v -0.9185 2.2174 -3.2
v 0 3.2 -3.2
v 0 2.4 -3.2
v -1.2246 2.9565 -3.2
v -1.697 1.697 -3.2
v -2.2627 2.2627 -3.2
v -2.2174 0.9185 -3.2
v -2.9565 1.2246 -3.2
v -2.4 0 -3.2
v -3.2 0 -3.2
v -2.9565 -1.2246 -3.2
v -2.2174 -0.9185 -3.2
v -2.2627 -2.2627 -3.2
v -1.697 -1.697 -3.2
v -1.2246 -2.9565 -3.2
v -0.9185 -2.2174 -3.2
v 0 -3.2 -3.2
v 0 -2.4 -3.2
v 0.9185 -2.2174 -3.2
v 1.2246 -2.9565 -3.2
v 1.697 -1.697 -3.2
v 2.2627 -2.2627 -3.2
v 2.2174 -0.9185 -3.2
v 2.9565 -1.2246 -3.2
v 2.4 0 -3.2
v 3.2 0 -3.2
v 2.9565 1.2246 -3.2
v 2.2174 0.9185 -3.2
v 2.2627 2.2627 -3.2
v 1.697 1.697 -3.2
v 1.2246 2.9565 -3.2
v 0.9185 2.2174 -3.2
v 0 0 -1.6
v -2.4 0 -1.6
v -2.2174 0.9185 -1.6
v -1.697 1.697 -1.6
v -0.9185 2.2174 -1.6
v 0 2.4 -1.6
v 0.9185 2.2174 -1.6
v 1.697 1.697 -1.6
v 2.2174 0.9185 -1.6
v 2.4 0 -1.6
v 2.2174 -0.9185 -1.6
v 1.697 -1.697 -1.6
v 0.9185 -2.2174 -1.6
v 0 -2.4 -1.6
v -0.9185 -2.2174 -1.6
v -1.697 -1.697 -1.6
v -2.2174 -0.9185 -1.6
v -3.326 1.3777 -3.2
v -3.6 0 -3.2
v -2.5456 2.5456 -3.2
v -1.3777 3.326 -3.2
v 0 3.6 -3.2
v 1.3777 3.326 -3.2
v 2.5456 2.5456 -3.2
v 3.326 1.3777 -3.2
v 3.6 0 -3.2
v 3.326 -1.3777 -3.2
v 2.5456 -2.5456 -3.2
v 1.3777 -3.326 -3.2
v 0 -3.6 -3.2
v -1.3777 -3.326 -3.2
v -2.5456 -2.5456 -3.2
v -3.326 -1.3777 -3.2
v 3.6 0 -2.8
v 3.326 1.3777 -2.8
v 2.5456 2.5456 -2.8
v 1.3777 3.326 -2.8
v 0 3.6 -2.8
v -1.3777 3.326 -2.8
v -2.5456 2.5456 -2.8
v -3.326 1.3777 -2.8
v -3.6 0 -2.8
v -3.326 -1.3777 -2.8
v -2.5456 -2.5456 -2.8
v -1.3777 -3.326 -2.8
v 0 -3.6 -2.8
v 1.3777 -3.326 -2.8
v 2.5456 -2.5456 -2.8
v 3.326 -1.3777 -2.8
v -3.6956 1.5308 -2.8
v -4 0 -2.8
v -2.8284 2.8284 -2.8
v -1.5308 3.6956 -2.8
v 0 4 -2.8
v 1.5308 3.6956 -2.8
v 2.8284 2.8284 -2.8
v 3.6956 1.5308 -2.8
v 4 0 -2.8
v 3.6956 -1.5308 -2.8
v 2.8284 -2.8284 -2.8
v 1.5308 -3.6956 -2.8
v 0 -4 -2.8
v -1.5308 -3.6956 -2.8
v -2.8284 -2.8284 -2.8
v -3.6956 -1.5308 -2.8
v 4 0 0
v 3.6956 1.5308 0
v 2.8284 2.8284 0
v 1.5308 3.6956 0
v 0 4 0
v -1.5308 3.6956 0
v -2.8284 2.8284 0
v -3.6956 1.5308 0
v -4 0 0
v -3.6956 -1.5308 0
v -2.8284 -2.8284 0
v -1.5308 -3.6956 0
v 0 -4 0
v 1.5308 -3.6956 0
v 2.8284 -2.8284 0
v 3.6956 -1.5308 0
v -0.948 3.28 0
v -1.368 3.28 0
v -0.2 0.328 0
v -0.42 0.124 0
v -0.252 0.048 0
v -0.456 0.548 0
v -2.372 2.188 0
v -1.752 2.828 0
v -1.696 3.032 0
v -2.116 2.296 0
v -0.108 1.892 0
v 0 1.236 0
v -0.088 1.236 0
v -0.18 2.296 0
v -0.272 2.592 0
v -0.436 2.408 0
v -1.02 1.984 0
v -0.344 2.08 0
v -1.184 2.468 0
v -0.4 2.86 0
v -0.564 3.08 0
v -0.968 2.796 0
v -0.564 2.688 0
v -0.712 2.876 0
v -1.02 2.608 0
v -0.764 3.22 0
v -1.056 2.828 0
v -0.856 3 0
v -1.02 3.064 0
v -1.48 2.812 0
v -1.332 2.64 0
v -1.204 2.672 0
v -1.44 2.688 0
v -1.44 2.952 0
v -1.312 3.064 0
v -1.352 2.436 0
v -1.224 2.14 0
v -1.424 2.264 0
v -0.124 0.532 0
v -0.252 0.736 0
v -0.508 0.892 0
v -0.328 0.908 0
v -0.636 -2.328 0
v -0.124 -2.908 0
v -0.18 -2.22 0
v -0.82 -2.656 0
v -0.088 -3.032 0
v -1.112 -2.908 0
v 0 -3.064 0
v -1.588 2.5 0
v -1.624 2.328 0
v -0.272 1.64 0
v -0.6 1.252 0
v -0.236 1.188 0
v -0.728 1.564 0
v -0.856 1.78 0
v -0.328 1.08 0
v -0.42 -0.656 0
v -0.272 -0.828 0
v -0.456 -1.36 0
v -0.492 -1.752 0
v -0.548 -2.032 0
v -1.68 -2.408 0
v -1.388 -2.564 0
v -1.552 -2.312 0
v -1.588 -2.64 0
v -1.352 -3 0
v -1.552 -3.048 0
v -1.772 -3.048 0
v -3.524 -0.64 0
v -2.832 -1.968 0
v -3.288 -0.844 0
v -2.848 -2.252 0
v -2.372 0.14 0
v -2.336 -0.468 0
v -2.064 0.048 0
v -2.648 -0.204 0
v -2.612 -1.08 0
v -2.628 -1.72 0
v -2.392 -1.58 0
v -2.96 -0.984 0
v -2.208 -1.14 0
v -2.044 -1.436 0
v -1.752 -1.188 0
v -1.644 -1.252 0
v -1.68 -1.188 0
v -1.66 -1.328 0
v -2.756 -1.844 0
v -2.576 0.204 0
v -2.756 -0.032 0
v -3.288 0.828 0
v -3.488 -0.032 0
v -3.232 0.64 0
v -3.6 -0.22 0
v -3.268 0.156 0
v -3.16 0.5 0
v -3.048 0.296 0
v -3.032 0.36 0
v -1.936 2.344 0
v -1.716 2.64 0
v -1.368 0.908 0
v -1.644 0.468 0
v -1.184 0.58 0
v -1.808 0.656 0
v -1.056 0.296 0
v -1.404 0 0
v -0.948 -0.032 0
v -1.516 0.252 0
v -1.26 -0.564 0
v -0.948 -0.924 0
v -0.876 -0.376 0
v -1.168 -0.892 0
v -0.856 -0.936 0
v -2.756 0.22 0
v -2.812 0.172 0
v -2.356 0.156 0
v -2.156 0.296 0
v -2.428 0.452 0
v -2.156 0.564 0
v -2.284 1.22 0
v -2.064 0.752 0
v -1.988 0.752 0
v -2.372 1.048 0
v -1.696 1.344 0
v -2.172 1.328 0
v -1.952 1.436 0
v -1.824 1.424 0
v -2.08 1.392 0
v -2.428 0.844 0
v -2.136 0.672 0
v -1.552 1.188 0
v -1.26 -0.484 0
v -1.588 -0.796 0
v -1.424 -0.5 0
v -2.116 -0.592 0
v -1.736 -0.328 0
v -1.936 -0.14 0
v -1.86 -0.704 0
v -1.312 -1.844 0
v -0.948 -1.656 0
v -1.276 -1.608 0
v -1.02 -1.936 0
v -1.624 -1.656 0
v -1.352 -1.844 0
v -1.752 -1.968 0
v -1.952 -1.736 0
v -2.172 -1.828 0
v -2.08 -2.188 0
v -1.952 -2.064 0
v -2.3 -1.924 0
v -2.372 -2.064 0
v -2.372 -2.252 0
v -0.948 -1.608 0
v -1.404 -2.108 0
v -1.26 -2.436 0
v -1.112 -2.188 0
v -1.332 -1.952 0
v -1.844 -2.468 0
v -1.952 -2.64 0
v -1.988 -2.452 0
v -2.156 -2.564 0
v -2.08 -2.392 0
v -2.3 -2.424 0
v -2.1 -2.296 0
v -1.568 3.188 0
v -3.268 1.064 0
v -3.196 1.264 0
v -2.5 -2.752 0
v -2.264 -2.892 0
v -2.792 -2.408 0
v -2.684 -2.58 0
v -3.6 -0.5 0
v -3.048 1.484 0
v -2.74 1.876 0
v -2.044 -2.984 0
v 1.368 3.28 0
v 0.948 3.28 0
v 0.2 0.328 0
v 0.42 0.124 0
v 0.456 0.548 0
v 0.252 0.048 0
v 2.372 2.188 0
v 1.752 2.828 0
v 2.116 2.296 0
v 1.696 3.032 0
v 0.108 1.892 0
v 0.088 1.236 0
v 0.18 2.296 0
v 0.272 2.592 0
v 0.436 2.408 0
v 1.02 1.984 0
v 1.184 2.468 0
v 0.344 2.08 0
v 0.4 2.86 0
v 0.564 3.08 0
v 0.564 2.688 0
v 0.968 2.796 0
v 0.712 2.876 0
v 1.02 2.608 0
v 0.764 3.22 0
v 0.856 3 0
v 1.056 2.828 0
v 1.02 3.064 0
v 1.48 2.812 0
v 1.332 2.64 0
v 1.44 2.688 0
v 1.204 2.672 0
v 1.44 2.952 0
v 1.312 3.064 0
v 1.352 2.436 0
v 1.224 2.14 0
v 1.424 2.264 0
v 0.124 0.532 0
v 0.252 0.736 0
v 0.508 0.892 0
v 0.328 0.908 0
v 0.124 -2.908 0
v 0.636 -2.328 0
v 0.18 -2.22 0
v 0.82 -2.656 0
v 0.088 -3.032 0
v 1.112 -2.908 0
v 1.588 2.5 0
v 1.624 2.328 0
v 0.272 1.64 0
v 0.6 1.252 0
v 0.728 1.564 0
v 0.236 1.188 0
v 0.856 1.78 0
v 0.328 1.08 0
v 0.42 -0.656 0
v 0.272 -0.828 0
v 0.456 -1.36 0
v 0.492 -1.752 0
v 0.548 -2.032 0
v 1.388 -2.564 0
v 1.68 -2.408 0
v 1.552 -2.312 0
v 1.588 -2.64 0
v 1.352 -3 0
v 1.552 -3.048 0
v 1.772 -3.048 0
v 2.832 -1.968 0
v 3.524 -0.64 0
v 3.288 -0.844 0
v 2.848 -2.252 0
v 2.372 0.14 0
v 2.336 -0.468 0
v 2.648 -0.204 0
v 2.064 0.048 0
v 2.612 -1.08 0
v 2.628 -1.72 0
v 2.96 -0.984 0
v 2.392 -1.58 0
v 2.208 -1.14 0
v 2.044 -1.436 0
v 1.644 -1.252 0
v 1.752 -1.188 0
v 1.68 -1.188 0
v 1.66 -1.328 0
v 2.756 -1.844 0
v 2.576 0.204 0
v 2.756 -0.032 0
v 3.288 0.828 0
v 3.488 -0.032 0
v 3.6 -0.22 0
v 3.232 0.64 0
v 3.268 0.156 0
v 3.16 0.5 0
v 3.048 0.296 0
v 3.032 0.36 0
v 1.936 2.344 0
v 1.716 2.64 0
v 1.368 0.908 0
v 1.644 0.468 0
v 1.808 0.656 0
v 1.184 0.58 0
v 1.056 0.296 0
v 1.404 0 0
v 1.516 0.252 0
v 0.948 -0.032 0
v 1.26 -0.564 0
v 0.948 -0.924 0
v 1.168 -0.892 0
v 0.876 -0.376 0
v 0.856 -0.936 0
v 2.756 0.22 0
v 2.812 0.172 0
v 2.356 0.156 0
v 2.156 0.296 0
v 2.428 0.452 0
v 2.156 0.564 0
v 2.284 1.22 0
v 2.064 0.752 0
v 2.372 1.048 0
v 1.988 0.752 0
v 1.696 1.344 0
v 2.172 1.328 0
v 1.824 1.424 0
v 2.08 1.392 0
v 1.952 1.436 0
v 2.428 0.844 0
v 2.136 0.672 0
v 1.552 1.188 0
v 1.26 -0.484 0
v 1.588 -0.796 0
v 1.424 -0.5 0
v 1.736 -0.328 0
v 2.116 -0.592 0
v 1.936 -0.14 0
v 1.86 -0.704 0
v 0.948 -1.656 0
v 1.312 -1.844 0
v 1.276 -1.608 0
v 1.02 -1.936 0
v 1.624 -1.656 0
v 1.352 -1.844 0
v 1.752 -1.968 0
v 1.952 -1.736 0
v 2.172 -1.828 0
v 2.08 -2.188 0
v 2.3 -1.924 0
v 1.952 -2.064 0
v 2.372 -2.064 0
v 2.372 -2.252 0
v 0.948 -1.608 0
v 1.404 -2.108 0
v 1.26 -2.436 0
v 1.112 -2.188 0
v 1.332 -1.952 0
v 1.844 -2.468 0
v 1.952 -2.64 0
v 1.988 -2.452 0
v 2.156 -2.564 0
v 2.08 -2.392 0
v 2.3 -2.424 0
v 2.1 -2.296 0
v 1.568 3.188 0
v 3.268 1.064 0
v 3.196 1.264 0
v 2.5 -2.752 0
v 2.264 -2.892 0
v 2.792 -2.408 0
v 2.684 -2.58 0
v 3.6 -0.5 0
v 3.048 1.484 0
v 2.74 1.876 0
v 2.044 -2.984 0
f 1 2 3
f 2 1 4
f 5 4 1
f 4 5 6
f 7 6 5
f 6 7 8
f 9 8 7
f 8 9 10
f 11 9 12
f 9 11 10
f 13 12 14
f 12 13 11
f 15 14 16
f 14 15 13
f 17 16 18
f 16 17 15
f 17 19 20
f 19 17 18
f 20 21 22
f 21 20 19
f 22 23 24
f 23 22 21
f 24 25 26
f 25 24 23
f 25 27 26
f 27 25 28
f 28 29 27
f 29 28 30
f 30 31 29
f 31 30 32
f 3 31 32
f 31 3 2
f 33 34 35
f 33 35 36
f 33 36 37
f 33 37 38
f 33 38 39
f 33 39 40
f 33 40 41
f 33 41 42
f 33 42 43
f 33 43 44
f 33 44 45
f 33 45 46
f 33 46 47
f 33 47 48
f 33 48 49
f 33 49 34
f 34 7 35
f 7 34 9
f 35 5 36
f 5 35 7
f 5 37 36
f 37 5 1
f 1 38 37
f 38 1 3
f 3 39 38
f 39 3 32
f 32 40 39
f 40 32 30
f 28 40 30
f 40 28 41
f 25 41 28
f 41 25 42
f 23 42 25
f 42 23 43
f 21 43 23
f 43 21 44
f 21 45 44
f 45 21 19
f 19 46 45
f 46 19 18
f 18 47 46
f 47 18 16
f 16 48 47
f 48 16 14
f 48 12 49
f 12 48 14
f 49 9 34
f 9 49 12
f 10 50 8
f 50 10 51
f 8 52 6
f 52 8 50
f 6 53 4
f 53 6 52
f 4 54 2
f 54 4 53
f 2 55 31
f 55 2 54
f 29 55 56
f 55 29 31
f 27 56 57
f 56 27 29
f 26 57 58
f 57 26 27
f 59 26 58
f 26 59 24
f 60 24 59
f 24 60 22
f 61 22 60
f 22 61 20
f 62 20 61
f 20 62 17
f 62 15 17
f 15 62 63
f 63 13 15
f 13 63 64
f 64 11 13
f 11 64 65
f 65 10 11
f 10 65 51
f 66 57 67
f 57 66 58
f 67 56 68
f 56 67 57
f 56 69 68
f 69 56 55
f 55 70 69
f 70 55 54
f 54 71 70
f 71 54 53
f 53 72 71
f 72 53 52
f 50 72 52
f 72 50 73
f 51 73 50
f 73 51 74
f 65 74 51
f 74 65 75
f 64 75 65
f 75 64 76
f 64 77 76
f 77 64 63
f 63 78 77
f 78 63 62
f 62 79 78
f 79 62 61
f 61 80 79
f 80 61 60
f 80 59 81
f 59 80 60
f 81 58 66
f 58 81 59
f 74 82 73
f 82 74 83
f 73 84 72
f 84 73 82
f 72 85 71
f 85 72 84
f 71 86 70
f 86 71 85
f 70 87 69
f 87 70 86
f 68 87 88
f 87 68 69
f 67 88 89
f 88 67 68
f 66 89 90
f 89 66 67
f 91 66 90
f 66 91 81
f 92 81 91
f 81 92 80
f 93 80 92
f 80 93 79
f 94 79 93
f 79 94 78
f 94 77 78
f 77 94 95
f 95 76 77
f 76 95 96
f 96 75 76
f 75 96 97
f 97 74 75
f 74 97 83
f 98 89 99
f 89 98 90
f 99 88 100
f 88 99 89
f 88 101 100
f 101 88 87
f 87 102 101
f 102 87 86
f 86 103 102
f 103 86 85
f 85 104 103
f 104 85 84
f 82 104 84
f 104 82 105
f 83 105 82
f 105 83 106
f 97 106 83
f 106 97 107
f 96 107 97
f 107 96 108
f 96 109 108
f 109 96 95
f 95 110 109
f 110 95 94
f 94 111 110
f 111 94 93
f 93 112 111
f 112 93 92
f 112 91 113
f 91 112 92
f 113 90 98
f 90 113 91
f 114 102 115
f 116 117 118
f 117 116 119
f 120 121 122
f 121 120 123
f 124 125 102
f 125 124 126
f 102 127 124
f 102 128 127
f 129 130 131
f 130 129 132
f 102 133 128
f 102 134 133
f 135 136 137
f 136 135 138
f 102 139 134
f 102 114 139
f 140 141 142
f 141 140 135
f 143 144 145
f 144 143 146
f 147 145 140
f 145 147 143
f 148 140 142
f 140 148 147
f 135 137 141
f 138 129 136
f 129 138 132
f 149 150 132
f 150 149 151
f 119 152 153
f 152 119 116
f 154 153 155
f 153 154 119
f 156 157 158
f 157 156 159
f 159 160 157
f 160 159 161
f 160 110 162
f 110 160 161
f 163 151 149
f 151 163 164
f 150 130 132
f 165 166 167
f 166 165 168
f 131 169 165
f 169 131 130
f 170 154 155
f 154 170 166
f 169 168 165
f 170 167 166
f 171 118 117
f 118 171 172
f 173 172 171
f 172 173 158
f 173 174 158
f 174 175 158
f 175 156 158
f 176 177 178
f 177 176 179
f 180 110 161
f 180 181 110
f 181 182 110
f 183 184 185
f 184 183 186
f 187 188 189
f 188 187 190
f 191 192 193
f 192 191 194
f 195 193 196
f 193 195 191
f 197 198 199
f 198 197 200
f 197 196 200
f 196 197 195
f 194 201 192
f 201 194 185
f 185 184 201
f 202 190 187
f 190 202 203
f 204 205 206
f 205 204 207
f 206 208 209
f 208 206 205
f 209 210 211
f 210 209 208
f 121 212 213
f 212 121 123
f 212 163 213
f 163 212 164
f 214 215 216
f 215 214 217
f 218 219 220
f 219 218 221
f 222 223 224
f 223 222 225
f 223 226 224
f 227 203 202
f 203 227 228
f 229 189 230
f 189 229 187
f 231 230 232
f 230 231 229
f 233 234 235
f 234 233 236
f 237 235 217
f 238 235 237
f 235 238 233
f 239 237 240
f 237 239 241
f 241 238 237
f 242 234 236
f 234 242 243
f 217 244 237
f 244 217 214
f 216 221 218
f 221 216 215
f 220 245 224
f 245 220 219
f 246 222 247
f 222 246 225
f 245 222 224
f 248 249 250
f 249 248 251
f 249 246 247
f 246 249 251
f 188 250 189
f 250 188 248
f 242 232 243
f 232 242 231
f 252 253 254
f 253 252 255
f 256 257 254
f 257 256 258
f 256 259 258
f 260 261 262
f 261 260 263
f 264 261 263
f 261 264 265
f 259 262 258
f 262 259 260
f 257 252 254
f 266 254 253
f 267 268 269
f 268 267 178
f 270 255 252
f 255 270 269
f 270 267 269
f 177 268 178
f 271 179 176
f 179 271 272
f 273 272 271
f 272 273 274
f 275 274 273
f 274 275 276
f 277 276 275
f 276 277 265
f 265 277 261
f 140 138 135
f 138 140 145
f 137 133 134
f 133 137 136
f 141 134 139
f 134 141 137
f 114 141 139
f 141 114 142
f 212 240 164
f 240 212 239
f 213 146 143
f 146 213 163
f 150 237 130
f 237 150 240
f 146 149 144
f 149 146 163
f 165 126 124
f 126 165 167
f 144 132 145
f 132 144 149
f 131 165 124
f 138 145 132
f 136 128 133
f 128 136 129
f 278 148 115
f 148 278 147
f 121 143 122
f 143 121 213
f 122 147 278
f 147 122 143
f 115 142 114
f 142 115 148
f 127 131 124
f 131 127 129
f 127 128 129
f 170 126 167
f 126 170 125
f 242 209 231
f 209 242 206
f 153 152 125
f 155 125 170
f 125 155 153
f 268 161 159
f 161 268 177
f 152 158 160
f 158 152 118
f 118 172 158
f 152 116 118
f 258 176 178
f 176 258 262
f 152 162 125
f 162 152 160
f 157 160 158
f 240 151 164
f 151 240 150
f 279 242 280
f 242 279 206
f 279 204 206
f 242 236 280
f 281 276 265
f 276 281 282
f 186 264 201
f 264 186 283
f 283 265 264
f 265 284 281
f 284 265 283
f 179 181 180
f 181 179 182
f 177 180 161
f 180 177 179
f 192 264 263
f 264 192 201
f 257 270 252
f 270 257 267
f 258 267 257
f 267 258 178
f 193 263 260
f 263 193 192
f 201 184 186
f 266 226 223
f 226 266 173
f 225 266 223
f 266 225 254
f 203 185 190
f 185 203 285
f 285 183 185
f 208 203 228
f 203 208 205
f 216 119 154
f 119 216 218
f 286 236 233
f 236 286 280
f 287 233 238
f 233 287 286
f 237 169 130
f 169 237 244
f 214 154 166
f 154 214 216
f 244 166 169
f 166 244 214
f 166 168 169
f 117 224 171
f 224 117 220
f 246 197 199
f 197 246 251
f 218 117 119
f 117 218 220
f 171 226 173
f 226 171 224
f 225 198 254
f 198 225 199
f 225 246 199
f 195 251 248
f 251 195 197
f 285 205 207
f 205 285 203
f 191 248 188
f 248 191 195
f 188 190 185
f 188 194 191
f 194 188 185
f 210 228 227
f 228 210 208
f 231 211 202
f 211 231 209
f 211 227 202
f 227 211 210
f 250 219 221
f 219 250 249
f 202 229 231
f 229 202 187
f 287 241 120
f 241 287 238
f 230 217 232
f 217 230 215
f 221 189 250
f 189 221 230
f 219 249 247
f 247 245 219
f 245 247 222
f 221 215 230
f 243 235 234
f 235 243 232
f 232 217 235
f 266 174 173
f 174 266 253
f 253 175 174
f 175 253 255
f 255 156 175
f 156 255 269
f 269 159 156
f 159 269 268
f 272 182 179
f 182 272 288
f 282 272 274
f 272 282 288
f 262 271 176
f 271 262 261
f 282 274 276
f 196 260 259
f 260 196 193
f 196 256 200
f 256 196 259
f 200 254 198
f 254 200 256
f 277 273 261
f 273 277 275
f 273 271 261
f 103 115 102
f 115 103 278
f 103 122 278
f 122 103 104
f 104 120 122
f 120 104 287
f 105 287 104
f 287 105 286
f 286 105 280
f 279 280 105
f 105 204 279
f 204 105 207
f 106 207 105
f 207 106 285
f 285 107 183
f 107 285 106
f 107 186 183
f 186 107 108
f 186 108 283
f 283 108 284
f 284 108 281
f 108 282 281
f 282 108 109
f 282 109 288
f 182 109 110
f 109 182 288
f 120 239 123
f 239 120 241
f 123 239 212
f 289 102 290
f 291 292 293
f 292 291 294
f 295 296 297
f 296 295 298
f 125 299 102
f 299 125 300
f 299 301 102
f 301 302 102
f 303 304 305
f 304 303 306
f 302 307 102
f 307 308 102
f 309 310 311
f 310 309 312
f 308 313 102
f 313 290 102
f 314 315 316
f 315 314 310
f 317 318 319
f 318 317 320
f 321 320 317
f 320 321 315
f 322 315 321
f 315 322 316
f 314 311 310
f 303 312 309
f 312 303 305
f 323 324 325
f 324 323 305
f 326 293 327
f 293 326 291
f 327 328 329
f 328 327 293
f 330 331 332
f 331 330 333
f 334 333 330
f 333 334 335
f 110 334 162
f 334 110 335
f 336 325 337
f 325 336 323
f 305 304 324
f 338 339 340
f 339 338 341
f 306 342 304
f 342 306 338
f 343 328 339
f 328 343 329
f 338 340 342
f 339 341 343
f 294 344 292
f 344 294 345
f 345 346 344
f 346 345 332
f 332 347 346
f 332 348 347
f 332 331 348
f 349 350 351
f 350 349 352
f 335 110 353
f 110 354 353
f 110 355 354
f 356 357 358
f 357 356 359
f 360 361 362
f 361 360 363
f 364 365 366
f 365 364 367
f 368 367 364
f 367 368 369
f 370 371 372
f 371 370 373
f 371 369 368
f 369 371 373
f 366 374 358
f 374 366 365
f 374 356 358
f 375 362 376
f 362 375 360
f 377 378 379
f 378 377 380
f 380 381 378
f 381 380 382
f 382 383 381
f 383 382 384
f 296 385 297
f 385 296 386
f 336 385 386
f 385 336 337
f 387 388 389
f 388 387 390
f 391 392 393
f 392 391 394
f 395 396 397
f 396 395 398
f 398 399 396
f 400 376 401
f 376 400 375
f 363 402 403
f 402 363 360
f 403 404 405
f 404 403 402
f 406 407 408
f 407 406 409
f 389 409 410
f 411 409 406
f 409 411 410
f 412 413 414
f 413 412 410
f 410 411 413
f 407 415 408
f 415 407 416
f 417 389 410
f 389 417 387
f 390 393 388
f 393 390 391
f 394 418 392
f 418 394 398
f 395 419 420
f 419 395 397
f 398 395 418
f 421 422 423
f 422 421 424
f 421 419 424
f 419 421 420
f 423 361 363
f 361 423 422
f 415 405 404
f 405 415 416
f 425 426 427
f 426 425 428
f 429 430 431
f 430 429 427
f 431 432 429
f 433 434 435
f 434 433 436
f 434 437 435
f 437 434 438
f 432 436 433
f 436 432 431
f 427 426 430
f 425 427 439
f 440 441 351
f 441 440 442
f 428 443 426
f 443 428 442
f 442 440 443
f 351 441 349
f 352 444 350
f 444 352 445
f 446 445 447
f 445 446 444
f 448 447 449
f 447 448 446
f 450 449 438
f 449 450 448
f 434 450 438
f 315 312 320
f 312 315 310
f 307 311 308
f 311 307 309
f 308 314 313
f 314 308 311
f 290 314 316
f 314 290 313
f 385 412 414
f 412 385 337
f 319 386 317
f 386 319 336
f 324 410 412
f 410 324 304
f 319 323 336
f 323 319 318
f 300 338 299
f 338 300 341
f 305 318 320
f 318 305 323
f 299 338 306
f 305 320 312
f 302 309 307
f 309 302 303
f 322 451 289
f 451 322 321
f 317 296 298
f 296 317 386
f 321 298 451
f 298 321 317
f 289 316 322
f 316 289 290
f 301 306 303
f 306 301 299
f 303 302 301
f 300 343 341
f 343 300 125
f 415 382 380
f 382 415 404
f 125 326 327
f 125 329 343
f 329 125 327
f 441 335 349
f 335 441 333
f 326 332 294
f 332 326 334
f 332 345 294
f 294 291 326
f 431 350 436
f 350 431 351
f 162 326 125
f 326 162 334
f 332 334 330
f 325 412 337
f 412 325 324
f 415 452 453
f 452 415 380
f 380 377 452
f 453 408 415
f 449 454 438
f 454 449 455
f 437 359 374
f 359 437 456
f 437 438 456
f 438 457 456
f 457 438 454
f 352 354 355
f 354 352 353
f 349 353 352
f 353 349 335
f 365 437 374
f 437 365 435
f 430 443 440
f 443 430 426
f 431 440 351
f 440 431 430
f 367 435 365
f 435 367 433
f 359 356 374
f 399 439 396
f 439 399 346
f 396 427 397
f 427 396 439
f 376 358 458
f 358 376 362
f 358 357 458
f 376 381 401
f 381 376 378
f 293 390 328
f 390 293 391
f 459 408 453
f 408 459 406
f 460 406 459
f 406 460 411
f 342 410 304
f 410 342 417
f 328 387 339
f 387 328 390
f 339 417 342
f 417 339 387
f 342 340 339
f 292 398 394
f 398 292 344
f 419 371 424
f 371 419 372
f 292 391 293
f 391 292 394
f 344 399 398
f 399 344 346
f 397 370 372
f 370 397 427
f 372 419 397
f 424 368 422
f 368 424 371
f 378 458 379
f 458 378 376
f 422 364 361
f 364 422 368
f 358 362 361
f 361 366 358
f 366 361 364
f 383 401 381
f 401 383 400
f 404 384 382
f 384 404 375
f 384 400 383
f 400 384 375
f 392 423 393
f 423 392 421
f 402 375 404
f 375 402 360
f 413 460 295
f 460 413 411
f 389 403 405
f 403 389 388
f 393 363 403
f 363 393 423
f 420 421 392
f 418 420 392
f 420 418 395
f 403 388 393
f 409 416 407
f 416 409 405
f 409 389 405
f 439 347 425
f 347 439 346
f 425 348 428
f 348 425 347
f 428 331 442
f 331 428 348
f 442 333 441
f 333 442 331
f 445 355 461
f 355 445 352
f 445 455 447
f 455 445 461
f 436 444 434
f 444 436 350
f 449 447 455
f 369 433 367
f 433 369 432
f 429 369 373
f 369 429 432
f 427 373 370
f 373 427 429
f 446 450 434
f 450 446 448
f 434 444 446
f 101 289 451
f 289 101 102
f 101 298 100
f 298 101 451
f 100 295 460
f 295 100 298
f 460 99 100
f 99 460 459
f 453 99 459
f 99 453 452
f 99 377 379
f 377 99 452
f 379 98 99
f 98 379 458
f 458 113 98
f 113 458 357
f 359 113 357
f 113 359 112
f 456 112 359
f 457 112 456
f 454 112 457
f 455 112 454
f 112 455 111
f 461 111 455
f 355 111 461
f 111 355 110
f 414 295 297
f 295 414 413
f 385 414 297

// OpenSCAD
use <../lib.scad>
use <../p/4-4ering.scad>
use <s/98138p46s01.scad>
use <s/98138s02.scad>
function ldraw_lib__98138p46() = [
// 0 Tile  1 x  1 Round with Black Butterfly Pattern
// 0 Name: 98138p46.dat
// 0 Author: Peter Grass [Evilspyre]
// 0 !LDRAW_ORG Part UPDATE 2026-05
// 0 !LICENSE Licensed under CC BY 4.0 : see CAreadme.txt
// 
// 0 BFC CERTIFY CCW
  [0,"BFC","CERTIFY"],
  [0,"BFC","CCW"],
// 
// 0 !KEYWORDS Bricklink 98138pb403, Brickowl 803698, Brickset 107045, Disney
// 0 !KEYWORDS Encanto, Insect, Rebrickable 98138pr0386, Set 43239
// 
// 0 !HISTORY 2026-05-31 [OrionP] Official Update 2026-05
// 
// 1 16 0 0 0 1 0 0 0 1 0 0 0 1 s\98138s02.dat
  [1,16,0,0,0,1,0,0,0,1,0,0,0,1, ldraw_lib__s__98138s02()],
// 1 16 0 0 0 10 0 0 0 1 0 0 0 10 4-4ering.dat
  [1,16,0,0,0,10,0,0,0,1,0,0,0,10, ldraw_lib__4_4ering()],
// 1 16 0 0 0 1 0 0 0 1 0 0 0 1 s\98138p46s01.dat
  [1,16,0,0,0,1,0,0,0,1,0,0,0,1, ldraw_lib__s__98138p46s01()],
// 1 16 0 0 0 -1 0 0 0 1 0 0 0 1 s\98138p46s01.dat
  [1,16,0,0,0,-1,0,0,0,1,0,0,0,1, ldraw_lib__s__98138p46s01()],
];
module ldraw_lib__98138p46(step=0, col=false, unit=2/5, alt=false, line=0.2, solid=!$preview)
    makepoly(ldraw_lib__98138p46(), step=step, col=col, unit=unit, alt=alt, line=line, solid=solid);
ldraw_lib__98138p46(line=0.2);
